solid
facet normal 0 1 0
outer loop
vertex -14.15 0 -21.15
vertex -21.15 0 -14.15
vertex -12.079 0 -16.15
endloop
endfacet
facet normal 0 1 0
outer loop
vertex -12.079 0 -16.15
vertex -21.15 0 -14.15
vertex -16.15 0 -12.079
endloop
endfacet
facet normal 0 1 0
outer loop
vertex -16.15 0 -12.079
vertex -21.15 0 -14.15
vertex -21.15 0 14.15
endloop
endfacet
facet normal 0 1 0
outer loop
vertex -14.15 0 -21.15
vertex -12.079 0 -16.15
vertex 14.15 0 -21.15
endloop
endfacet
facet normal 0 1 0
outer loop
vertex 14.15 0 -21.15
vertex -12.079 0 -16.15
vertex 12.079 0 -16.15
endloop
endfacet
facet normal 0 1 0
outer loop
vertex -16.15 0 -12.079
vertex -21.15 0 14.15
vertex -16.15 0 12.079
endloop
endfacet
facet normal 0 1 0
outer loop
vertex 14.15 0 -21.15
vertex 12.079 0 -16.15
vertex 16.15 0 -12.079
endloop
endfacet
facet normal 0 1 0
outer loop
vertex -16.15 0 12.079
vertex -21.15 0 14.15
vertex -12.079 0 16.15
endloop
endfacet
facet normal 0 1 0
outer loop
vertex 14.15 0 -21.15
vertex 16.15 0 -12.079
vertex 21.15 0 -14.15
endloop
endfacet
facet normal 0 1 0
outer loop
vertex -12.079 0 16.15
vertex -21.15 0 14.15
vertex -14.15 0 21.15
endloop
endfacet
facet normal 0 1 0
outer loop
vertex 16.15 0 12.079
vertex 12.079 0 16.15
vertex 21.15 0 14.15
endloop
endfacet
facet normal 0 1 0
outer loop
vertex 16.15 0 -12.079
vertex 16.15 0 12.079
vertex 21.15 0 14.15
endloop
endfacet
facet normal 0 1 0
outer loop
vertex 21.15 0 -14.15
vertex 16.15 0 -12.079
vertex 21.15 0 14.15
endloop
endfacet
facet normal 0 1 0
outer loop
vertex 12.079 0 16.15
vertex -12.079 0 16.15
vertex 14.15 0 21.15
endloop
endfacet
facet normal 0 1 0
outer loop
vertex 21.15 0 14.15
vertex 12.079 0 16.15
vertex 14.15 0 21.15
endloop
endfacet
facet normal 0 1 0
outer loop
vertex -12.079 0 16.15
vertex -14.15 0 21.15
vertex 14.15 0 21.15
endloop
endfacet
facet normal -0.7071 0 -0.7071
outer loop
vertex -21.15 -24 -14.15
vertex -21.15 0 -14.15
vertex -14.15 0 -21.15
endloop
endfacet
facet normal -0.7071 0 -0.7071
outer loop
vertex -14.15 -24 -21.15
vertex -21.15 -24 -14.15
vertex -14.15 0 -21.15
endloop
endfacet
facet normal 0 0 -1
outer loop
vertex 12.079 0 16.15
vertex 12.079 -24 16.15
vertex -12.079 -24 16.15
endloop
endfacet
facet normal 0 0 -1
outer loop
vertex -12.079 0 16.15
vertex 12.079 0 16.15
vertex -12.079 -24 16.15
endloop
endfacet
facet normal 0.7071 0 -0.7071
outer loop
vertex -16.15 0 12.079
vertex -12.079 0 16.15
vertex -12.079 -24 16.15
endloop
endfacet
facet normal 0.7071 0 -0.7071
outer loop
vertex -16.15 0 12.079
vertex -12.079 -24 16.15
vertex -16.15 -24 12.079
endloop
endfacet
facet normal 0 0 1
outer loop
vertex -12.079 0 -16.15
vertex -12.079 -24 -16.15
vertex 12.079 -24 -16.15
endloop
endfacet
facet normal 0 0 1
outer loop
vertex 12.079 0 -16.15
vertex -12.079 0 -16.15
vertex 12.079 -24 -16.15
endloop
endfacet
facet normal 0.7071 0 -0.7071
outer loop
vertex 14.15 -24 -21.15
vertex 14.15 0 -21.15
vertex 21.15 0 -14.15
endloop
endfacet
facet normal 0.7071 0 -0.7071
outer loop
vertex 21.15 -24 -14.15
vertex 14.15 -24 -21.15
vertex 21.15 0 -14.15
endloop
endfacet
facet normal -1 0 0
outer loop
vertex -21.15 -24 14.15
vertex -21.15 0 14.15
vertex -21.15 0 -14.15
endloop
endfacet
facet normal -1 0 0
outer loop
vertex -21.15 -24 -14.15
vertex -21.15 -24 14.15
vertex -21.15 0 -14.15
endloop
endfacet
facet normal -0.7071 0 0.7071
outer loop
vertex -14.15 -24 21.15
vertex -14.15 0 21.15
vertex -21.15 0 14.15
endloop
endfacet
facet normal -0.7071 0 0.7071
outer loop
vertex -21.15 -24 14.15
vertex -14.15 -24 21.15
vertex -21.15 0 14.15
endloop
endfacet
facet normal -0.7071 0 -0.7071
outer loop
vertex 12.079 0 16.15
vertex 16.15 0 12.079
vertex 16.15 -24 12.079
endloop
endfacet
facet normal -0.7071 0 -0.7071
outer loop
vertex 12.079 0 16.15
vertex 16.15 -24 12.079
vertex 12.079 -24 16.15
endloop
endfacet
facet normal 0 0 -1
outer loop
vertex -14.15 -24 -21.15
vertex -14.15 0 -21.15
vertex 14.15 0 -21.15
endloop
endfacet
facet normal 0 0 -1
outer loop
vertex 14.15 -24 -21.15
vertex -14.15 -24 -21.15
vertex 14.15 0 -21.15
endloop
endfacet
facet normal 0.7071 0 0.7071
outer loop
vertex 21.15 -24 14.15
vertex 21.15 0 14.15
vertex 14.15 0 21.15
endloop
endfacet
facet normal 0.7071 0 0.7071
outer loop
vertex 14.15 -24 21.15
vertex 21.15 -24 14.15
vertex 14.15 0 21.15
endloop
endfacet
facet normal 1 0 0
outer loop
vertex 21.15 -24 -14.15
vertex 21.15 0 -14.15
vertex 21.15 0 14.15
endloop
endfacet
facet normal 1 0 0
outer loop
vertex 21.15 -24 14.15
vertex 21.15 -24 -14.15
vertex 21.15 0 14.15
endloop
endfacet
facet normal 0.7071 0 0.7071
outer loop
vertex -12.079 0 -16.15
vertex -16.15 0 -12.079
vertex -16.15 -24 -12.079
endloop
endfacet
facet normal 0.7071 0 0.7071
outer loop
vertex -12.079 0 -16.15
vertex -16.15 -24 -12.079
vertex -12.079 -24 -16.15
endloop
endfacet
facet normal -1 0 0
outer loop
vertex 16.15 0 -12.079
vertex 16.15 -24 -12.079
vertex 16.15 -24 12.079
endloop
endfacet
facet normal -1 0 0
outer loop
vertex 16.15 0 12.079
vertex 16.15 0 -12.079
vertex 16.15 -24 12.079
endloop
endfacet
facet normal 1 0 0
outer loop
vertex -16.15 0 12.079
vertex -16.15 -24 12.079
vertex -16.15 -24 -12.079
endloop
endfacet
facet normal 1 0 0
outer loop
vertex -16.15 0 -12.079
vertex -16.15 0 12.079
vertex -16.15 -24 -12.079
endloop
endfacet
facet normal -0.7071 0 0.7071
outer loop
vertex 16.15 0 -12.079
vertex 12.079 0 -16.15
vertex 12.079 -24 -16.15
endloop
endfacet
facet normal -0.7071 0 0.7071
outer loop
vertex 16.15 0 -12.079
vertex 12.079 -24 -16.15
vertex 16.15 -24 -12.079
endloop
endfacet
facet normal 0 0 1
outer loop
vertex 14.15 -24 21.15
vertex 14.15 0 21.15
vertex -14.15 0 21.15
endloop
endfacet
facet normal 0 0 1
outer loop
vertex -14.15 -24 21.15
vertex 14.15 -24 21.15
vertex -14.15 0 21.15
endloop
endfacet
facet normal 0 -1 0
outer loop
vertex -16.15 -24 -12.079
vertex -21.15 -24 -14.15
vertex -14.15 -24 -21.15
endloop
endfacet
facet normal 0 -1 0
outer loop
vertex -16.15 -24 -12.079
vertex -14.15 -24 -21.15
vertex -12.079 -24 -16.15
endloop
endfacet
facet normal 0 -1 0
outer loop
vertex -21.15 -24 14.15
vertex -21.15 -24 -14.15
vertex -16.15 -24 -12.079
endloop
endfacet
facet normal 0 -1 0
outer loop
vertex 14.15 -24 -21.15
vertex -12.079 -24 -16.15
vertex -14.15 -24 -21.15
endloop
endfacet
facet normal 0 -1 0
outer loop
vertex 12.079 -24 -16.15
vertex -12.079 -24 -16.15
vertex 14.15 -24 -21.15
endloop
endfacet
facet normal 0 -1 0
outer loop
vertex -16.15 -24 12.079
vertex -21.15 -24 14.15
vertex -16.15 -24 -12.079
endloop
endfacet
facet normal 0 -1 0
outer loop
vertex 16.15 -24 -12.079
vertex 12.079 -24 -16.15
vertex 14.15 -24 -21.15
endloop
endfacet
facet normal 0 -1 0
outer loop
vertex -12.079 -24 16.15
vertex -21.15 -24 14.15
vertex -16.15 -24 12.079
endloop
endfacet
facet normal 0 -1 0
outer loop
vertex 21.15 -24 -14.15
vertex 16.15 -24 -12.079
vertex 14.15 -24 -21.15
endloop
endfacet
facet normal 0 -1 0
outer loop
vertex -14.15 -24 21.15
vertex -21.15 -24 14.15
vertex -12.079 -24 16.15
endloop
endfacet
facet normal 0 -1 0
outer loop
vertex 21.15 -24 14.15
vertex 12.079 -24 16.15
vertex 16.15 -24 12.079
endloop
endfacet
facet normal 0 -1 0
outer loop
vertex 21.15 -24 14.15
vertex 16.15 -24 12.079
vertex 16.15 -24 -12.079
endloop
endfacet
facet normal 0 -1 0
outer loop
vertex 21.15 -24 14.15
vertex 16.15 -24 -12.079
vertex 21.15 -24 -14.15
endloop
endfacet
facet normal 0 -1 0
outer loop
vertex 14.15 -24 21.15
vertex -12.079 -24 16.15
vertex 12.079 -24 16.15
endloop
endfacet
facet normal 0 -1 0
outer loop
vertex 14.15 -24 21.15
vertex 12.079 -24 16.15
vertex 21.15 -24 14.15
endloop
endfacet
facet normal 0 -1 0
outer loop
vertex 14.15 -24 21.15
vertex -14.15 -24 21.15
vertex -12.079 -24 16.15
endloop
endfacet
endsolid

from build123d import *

# Parameters (mm, degrees)
F1_DEPTH = 24
F3_DEPTH = 24.001


with BuildPart() as f1:
    # F0 (on Front) → F1 (new body)
    with BuildSketch(Plane.XZ):
        Polygon((21.15, 14.15), (14.15, 21.15), (-14.15, 21.15), (-21.15, 14.15), (-21.15, -14.15), (-14.15, -21.15), (14.15, -21.15), (21.15, -14.15), align=None)
    extrude(amount=F1_DEPTH)

    # F2 (on face) → F3 (cut, through all)
    with BuildSketch(Plane.XZ.offset(24)):
        Polygon((12.078932, -16.15), (16.15, -12.078932), (16.15, 12.078932), (12.078932, 16.15), (-12.078932, 16.15), (-16.15, 12.078932), (-16.15, -12.078932), (-12.078932, -16.15), align=None)
    extrude(amount=-F3_DEPTH, mode=Mode.SUBTRACT)


solid = f1.part
